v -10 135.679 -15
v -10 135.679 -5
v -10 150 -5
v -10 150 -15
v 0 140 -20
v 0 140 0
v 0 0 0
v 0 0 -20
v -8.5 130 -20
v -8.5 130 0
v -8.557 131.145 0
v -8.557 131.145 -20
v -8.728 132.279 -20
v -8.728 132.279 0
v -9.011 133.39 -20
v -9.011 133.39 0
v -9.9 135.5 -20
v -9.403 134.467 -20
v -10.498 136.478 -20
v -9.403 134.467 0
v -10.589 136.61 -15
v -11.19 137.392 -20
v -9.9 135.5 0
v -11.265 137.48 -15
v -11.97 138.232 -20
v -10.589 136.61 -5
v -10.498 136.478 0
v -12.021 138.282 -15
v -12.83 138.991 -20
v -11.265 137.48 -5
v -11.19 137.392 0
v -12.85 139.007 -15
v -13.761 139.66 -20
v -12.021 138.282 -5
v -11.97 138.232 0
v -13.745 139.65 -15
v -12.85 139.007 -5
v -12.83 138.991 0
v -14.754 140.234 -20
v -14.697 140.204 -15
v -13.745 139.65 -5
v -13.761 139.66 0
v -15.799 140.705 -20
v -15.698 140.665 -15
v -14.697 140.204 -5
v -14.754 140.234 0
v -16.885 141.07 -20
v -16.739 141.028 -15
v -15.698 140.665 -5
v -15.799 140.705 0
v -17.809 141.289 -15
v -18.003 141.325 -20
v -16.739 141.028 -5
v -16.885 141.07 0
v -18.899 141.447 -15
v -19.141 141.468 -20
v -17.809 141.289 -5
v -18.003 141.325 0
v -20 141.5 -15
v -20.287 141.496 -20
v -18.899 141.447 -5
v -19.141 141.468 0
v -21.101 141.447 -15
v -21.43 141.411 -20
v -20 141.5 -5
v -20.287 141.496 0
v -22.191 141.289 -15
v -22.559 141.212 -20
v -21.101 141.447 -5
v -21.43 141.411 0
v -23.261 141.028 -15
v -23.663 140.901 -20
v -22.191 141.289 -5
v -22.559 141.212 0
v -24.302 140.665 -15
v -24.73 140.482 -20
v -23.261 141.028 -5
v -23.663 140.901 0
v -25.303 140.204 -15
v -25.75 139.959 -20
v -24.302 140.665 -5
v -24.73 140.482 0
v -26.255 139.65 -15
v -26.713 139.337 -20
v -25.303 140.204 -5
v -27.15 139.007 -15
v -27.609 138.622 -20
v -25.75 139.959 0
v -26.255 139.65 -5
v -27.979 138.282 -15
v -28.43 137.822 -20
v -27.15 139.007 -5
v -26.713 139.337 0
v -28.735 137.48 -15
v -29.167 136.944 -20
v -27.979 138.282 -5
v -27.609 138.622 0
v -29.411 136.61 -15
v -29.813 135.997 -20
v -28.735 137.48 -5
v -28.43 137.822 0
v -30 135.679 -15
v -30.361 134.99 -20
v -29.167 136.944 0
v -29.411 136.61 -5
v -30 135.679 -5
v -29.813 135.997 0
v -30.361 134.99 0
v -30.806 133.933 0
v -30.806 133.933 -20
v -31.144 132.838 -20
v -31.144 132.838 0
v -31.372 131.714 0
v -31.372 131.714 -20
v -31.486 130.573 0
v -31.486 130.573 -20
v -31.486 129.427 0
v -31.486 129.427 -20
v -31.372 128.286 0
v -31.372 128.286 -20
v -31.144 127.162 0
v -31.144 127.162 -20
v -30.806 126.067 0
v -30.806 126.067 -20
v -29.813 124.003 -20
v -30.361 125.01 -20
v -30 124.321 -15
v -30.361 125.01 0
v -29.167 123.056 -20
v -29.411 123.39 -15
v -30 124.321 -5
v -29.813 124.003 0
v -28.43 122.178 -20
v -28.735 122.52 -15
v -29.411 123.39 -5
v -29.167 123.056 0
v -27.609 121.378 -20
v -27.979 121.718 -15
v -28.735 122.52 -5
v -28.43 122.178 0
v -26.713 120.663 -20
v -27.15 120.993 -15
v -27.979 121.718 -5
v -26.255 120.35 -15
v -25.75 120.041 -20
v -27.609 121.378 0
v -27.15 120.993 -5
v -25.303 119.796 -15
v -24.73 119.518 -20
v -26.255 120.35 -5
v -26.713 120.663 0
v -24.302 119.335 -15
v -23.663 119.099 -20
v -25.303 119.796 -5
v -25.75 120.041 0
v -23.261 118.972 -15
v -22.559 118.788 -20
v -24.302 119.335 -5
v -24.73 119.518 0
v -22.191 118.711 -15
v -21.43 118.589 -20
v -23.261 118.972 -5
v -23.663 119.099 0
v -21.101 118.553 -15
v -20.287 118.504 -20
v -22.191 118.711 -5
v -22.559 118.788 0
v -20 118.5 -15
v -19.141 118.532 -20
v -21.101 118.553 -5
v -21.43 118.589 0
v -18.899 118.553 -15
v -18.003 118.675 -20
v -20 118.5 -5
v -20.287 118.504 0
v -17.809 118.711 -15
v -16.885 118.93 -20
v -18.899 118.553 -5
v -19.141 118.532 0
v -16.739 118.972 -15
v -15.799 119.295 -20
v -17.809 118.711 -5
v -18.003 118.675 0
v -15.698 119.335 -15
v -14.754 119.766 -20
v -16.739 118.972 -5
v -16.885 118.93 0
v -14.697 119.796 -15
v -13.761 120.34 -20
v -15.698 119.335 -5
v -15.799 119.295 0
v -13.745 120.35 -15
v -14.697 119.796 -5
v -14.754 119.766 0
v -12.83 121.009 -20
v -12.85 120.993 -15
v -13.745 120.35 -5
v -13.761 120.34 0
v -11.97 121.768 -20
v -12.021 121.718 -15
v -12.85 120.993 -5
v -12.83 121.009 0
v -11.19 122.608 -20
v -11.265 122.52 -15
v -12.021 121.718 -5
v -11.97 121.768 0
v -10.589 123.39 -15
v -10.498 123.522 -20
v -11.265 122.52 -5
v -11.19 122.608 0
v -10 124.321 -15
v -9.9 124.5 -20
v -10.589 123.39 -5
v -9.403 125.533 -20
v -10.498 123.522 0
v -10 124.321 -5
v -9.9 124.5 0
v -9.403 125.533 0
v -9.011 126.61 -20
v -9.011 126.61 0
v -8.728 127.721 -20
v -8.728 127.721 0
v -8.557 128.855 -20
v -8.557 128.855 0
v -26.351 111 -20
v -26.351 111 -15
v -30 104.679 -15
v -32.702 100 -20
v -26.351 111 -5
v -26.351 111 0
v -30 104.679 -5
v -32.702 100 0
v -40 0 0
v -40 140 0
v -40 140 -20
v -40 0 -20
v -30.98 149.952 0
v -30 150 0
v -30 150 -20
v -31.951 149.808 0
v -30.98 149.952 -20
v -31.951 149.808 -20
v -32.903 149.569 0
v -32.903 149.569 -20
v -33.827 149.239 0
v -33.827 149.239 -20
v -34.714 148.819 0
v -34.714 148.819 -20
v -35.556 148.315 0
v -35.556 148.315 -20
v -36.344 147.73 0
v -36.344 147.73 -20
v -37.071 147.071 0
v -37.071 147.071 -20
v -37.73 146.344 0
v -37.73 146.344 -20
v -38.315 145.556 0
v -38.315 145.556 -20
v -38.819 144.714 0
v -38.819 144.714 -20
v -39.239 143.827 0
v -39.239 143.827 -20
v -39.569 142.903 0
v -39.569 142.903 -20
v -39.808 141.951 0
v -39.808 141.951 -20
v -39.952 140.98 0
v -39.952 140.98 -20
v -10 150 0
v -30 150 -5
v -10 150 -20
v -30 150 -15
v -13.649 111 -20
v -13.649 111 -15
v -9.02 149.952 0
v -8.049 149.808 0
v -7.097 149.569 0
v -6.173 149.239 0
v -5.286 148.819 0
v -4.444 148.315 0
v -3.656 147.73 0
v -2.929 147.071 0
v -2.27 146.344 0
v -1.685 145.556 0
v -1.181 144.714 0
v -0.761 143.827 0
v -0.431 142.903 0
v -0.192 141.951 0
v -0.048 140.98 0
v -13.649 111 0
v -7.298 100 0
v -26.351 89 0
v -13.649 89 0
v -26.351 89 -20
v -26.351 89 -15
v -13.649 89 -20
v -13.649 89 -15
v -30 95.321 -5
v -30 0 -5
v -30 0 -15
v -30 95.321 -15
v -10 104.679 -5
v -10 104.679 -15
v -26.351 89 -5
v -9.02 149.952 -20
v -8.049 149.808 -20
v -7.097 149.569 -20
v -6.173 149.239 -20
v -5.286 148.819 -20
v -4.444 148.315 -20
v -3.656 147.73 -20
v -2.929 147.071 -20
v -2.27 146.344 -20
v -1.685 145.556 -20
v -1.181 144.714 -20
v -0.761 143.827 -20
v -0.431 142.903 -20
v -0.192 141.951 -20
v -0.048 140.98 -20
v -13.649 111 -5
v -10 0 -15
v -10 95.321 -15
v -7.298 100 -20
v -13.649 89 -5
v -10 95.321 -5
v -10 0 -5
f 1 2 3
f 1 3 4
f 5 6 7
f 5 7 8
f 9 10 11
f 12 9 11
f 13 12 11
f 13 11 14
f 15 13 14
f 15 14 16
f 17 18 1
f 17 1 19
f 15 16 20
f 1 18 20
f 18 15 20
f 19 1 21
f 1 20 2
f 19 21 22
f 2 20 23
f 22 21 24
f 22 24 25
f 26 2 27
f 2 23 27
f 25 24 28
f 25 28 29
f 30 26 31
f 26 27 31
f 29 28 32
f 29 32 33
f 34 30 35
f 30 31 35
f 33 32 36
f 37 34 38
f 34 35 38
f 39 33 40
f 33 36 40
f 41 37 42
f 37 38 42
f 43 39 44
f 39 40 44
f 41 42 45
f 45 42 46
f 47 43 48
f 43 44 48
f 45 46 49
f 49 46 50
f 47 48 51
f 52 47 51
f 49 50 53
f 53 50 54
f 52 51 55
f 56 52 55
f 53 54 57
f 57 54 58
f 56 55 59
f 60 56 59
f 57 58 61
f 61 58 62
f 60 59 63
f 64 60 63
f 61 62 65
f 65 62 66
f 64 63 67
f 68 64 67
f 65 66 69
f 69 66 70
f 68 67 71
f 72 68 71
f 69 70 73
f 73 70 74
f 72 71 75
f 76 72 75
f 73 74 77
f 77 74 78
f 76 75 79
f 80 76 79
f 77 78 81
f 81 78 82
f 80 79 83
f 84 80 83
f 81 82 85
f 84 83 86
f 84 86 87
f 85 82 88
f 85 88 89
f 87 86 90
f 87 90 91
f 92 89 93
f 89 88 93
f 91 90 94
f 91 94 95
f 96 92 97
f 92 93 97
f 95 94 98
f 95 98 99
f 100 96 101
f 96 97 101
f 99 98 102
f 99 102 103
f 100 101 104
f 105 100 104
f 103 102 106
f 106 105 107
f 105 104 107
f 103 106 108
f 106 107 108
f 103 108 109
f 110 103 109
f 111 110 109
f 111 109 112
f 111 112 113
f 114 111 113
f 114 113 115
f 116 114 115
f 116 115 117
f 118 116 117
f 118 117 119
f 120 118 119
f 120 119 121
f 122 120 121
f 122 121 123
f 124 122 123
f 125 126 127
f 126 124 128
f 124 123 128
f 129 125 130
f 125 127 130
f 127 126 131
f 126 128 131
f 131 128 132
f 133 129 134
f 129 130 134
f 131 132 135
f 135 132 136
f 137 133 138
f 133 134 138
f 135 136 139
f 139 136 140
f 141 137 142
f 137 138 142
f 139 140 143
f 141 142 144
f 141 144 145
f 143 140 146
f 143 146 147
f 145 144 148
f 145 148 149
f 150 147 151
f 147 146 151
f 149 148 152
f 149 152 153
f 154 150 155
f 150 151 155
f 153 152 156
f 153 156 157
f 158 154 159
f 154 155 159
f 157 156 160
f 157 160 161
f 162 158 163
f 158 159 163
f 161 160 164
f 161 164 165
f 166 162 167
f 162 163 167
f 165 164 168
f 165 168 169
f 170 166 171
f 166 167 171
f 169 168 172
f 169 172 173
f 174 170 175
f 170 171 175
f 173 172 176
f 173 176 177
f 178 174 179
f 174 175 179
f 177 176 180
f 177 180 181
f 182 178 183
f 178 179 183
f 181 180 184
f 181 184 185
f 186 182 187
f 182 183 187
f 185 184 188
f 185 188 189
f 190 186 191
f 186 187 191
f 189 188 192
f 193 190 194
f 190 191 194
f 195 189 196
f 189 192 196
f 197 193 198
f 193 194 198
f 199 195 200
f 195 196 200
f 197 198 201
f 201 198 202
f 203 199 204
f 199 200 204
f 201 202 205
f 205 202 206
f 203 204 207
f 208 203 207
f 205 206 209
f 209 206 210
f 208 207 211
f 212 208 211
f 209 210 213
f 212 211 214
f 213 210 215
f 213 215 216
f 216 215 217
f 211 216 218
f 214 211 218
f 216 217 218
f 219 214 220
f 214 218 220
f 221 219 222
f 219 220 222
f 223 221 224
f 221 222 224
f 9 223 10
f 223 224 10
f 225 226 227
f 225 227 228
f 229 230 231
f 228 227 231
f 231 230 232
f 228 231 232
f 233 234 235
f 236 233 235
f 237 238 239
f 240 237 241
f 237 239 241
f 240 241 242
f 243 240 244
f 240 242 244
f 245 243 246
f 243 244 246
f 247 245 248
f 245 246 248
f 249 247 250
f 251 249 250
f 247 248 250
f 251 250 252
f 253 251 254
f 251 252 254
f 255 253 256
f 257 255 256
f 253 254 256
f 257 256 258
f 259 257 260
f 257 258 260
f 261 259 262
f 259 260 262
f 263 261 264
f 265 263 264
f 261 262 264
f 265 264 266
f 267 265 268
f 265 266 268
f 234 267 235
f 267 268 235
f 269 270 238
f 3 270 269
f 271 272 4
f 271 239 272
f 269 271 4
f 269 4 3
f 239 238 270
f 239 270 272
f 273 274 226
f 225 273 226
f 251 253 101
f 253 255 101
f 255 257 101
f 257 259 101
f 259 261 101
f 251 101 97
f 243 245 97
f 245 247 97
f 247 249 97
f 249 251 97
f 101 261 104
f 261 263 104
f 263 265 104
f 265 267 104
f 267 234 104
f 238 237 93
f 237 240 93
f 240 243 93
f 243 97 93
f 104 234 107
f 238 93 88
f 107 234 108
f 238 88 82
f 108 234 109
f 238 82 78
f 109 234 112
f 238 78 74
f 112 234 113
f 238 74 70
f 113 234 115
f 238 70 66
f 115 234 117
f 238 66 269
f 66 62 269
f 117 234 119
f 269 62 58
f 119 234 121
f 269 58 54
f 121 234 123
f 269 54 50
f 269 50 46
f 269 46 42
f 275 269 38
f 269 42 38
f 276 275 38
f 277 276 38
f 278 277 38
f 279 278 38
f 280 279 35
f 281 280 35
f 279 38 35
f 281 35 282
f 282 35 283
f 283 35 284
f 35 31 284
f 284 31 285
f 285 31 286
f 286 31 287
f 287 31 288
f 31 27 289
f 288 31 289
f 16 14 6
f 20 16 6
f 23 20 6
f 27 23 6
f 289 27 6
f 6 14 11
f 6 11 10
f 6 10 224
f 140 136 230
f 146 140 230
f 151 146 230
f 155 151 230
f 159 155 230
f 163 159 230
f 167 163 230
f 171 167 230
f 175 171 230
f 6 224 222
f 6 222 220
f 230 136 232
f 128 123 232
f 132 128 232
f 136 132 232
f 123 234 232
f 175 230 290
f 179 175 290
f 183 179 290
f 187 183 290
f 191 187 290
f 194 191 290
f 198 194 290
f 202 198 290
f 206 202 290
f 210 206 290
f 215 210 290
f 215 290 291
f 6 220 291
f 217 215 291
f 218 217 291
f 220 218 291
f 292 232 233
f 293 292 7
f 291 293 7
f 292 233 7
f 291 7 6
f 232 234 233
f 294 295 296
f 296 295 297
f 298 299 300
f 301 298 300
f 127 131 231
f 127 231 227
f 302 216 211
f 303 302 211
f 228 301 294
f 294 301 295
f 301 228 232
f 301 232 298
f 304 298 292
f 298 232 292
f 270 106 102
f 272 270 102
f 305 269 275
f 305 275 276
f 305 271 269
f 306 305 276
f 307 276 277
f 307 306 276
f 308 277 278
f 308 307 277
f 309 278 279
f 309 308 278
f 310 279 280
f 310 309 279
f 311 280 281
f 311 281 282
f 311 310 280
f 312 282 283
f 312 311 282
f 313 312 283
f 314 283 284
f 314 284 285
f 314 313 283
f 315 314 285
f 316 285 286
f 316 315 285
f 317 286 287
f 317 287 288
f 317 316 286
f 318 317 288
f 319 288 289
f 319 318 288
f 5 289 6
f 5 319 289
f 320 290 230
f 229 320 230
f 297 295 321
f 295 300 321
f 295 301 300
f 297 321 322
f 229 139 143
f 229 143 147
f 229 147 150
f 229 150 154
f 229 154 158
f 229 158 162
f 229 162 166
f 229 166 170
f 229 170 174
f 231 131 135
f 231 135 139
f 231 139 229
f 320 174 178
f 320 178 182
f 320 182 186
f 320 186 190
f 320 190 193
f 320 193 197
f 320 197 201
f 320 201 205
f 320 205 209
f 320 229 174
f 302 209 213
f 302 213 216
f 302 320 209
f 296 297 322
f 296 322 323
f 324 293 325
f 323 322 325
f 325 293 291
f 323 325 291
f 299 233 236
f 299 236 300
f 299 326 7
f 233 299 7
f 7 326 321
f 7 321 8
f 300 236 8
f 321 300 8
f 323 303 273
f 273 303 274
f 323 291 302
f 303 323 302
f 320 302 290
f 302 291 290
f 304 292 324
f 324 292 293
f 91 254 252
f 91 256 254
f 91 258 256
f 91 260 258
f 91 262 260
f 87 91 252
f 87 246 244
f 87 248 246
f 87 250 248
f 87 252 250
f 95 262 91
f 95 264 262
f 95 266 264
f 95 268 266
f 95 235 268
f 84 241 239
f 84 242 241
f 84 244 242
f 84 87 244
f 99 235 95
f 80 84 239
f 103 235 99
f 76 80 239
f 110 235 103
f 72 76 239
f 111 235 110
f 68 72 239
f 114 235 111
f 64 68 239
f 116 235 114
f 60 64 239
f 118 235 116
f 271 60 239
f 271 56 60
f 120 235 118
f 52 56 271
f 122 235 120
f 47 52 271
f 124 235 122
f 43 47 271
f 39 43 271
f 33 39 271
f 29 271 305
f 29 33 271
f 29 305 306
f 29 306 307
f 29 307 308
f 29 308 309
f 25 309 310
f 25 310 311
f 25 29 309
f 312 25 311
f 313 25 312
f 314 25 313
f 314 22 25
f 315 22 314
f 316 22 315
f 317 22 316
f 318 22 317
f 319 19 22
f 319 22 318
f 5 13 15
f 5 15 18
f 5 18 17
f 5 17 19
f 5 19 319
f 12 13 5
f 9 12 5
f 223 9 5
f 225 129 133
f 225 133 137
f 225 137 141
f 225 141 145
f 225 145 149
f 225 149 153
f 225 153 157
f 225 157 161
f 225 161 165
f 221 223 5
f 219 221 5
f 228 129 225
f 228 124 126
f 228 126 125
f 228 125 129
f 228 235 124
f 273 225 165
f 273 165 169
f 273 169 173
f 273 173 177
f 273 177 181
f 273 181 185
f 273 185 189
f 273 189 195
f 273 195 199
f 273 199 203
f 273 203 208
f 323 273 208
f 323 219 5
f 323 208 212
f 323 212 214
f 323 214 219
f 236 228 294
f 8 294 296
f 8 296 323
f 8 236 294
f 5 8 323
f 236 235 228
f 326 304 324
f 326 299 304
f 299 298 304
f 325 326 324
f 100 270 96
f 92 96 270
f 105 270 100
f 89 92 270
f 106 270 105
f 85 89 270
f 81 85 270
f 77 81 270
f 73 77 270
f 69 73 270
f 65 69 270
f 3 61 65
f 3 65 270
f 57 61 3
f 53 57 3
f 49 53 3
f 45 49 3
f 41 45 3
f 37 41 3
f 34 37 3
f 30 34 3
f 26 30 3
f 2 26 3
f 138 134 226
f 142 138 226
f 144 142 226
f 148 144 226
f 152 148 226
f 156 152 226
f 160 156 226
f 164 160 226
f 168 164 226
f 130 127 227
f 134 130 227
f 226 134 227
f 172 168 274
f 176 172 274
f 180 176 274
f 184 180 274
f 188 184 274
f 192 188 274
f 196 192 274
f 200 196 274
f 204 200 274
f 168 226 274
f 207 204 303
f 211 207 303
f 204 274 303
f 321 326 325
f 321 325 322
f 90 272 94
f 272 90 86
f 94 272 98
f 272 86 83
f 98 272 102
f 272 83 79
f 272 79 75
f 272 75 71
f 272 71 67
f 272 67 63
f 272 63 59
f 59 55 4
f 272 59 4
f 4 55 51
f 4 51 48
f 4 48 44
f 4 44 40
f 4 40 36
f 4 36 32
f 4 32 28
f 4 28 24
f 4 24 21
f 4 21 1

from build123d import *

# Parameters (mm, degrees)
ESQUISSE1_W                  = 40
ESQUISSE1_H                  = 20
BOSS_EXTRU_2_DEPTH           = 150
ESQUISSE2_R                  = 11.5
ENL_V_MAT_EXTRU_1_DEPTH      = 157.524758425
ENL_V_MAT_EXTRU_2_DEPTH      = 157.524758425
ENL_V_MAT_EXTRU_3_DEPTH      = 157.524758425
ENL_V_MAT_EXTRU_3_DEPTH_BACK = 157.524758425
ESQUISSE4_W                  = 20
ESQUISSE4_H                  = 10
CONG_2_R                     = 10
CONG_5_R                     = 10


with BuildPart() as part:
    # Esquisse1 → Boss.-Extru.2 (new body)
    with BuildSketch(Plane(origin=(0, 0, 0), x_dir=(1, 0, 0), z_dir=(0, 1, 0))):
        with Locations((-20, 10)):
            Rectangle(ESQUISSE1_W, ESQUISSE1_H)
    extrude(amount=BOSS_EXTRU_2_DEPTH)

    # Esquisse2 → Enlèv. mat.-Extru.1 (cut, through all)
    with BuildSketch(Plane.XY):
        with Locations((-20, 130)):
            Circle(ESQUISSE2_R)
    extrude(amount=-ENL_V_MAT_EXTRU_1_DEPTH, mode=Mode.SUBTRACT)

    # Esquisse3 → Enlèv. mat.-Extru.2 (cut, through all)
    with BuildSketch(Plane.XY):
        Polygon((-26.350852961, 111), (-32.701705922, 100), (-26.350852961, 89), (-13.649147039, 89), (-7.298294078, 100), (-13.649147039, 111), align=None)
    extrude(amount=-ENL_V_MAT_EXTRU_2_DEPTH, mode=Mode.SUBTRACT)

    # Esquisse4 → Enlèv. mat.-Extru.3 (cut, two sides: drawn at the far end of the back side and taken through both)
    with BuildSketch(Plane(origin=(0, 150, 0), x_dir=(1, 0, 0), z_dir=(0, 1, 0)).offset(-ENL_V_MAT_EXTRU_3_DEPTH_BACK)):
        with Locations((-20, 10)):
            Rectangle(ESQUISSE4_W, ESQUISSE4_H)
    extrude(amount=ENL_V_MAT_EXTRU_3_DEPTH + ENL_V_MAT_EXTRU_3_DEPTH_BACK, mode=Mode.SUBTRACT)

    # Congé2
    cong_2_edges = [part.edges().sort_by_distance(p)[0] for p in [
        (0, 150, -10),
    ]]
    fillet(cong_2_edges, radius=CONG_2_R - 0.0001)  # a hair under: the kernel refuses the full size

    # Congé5
    cong_5_edges = [part.edges().sort_by_distance(p)[0] for p in [
        (-40, 150, -10),
    ]]
    fillet(cong_5_edges, radius=CONG_5_R - 0.0001)  # a hair under: the kernel refuses the full size


solid = part.part
